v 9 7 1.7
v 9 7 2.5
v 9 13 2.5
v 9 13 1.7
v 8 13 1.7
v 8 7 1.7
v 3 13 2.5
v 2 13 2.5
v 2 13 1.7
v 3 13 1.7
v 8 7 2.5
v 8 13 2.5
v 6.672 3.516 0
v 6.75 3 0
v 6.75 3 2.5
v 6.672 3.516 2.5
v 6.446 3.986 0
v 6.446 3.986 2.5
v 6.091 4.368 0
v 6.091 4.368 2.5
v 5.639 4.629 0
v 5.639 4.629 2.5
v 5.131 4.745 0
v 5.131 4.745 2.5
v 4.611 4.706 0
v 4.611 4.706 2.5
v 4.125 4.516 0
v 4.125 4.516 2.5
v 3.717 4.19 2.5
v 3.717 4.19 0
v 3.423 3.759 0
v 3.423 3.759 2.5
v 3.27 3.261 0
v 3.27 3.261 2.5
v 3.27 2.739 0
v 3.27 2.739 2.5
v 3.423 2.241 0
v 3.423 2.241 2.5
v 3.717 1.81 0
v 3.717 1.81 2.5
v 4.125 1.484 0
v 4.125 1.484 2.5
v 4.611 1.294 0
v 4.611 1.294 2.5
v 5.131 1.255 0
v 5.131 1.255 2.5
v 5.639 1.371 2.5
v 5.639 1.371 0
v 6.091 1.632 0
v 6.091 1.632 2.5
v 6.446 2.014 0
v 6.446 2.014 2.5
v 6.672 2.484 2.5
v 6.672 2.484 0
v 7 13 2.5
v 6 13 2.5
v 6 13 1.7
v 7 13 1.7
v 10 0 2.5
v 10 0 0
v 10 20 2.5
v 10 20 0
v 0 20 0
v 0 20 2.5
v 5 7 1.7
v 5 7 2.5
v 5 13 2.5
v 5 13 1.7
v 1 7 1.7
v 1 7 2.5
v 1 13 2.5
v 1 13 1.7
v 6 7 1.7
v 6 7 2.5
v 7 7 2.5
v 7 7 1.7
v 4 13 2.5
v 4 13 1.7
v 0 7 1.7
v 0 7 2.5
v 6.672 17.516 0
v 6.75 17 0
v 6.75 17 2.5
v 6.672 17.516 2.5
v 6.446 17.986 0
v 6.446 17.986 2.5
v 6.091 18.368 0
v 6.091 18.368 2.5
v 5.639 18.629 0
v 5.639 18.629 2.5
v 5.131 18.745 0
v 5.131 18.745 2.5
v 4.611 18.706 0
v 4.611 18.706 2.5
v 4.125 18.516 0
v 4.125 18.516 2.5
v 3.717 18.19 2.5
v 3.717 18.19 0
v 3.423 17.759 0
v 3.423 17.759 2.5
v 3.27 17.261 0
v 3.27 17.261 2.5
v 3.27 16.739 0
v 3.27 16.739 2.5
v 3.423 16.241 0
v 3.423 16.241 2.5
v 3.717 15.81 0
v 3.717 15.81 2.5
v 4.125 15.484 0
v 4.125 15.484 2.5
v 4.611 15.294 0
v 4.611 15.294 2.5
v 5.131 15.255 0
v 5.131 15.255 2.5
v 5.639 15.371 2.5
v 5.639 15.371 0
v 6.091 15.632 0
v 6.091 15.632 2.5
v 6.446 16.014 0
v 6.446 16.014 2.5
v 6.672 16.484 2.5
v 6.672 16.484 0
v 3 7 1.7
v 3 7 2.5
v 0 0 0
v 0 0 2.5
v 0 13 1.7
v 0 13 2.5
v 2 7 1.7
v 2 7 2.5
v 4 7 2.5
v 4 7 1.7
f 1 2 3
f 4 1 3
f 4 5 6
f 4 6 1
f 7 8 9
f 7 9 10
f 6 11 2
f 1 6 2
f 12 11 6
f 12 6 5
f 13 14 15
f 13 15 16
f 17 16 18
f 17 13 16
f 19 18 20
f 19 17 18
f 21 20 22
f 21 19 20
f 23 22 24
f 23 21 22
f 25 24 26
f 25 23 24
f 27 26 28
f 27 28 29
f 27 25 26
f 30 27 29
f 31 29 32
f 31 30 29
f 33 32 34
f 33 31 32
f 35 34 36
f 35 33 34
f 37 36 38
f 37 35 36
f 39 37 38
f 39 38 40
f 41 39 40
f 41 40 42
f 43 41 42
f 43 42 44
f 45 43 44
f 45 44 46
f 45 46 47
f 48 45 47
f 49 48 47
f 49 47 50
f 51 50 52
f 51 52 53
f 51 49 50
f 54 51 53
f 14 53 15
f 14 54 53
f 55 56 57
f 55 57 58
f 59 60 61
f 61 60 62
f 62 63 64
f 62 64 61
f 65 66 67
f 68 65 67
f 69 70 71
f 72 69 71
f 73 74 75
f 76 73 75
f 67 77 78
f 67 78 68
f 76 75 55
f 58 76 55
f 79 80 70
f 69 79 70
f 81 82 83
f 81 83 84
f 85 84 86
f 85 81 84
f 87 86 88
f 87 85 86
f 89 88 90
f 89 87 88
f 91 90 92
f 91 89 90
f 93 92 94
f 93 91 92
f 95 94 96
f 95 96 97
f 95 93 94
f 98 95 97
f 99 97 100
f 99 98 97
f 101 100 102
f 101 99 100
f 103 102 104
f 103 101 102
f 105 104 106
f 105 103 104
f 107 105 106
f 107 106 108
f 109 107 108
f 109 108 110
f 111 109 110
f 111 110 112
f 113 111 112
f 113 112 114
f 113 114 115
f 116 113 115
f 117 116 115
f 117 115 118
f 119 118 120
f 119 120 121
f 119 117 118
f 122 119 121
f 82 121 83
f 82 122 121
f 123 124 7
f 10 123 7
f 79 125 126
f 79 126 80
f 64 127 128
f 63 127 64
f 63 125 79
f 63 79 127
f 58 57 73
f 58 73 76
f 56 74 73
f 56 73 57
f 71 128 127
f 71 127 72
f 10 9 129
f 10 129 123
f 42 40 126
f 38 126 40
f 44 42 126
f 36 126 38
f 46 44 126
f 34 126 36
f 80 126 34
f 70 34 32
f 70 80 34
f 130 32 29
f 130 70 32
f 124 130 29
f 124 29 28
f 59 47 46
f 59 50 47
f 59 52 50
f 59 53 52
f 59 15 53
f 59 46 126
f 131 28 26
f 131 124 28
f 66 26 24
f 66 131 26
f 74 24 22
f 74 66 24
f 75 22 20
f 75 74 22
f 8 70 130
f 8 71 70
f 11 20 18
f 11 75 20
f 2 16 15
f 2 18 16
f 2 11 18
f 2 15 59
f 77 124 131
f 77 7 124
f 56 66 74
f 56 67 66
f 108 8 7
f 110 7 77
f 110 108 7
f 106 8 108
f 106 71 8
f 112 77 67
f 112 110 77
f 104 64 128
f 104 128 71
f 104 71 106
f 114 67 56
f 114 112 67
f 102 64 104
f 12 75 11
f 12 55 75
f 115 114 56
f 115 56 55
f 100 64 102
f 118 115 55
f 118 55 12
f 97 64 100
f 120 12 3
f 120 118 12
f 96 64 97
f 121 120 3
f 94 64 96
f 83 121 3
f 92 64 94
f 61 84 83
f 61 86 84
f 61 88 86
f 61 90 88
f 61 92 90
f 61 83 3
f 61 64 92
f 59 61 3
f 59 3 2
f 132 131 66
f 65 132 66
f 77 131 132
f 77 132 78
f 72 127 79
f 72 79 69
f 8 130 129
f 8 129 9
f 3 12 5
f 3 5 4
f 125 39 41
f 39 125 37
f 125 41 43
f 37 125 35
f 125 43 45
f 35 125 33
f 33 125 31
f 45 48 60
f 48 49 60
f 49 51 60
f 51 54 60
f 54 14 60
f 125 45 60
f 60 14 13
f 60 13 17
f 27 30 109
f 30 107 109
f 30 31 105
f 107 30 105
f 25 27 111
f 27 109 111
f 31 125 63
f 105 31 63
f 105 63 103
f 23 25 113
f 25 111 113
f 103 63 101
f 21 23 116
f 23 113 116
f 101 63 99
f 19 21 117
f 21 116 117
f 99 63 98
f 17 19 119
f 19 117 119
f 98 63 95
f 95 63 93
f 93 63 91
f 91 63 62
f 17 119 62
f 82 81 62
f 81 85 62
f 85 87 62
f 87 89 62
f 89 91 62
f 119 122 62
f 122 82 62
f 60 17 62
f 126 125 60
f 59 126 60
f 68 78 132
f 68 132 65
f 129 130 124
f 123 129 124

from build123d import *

# Parameters (mm, degrees)
SKETCH_1_W          = 10
SKETCH_1_H          = 20
SKETCH_1_R          = 1.75
EXTRUDE_1_DEPTH     = 2.5
SKETCH_2_W          = 1
SKETCH_2_H          = 6
CUT_EXTRUDE_1_DEPTH = 0.8


with BuildPart() as part:
    # Эскиз1 → Бобышка-Вытянуть1 (new body)
    with BuildSketch(Plane.XY):
        with Locations((5, 10)):
            Rectangle(SKETCH_1_W, SKETCH_1_H)
        with Locations((5, 17)):
            Circle(SKETCH_1_R, mode=Mode.SUBTRACT)
        with Locations((5, 3)):
            Circle(SKETCH_1_R, mode=Mode.SUBTRACT)
    extrude(amount=EXTRUDE_1_DEPTH)

    # Эскиз2 → Вырез-Вытянуть1 (cut)
    with BuildSketch(Plane.XY.offset(2.5)):
        with Locations((0.5, 10)):
            Rectangle(SKETCH_2_W, SKETCH_2_H)
        with Locations((2.5, 10)):
            Rectangle(SKETCH_2_W, SKETCH_2_H)
        with Locations((4.5, 10)):
            Rectangle(SKETCH_2_W, SKETCH_2_H)
        with Locations((6.5, 10)):
            Rectangle(SKETCH_2_W, SKETCH_2_H)
        with Locations((8.5, 10)):
            Rectangle(SKETCH_2_W, SKETCH_2_H)
    extrude(amount=-CUT_EXTRUDE_1_DEPTH, mode=Mode.SUBTRACT)


solid = part.part
